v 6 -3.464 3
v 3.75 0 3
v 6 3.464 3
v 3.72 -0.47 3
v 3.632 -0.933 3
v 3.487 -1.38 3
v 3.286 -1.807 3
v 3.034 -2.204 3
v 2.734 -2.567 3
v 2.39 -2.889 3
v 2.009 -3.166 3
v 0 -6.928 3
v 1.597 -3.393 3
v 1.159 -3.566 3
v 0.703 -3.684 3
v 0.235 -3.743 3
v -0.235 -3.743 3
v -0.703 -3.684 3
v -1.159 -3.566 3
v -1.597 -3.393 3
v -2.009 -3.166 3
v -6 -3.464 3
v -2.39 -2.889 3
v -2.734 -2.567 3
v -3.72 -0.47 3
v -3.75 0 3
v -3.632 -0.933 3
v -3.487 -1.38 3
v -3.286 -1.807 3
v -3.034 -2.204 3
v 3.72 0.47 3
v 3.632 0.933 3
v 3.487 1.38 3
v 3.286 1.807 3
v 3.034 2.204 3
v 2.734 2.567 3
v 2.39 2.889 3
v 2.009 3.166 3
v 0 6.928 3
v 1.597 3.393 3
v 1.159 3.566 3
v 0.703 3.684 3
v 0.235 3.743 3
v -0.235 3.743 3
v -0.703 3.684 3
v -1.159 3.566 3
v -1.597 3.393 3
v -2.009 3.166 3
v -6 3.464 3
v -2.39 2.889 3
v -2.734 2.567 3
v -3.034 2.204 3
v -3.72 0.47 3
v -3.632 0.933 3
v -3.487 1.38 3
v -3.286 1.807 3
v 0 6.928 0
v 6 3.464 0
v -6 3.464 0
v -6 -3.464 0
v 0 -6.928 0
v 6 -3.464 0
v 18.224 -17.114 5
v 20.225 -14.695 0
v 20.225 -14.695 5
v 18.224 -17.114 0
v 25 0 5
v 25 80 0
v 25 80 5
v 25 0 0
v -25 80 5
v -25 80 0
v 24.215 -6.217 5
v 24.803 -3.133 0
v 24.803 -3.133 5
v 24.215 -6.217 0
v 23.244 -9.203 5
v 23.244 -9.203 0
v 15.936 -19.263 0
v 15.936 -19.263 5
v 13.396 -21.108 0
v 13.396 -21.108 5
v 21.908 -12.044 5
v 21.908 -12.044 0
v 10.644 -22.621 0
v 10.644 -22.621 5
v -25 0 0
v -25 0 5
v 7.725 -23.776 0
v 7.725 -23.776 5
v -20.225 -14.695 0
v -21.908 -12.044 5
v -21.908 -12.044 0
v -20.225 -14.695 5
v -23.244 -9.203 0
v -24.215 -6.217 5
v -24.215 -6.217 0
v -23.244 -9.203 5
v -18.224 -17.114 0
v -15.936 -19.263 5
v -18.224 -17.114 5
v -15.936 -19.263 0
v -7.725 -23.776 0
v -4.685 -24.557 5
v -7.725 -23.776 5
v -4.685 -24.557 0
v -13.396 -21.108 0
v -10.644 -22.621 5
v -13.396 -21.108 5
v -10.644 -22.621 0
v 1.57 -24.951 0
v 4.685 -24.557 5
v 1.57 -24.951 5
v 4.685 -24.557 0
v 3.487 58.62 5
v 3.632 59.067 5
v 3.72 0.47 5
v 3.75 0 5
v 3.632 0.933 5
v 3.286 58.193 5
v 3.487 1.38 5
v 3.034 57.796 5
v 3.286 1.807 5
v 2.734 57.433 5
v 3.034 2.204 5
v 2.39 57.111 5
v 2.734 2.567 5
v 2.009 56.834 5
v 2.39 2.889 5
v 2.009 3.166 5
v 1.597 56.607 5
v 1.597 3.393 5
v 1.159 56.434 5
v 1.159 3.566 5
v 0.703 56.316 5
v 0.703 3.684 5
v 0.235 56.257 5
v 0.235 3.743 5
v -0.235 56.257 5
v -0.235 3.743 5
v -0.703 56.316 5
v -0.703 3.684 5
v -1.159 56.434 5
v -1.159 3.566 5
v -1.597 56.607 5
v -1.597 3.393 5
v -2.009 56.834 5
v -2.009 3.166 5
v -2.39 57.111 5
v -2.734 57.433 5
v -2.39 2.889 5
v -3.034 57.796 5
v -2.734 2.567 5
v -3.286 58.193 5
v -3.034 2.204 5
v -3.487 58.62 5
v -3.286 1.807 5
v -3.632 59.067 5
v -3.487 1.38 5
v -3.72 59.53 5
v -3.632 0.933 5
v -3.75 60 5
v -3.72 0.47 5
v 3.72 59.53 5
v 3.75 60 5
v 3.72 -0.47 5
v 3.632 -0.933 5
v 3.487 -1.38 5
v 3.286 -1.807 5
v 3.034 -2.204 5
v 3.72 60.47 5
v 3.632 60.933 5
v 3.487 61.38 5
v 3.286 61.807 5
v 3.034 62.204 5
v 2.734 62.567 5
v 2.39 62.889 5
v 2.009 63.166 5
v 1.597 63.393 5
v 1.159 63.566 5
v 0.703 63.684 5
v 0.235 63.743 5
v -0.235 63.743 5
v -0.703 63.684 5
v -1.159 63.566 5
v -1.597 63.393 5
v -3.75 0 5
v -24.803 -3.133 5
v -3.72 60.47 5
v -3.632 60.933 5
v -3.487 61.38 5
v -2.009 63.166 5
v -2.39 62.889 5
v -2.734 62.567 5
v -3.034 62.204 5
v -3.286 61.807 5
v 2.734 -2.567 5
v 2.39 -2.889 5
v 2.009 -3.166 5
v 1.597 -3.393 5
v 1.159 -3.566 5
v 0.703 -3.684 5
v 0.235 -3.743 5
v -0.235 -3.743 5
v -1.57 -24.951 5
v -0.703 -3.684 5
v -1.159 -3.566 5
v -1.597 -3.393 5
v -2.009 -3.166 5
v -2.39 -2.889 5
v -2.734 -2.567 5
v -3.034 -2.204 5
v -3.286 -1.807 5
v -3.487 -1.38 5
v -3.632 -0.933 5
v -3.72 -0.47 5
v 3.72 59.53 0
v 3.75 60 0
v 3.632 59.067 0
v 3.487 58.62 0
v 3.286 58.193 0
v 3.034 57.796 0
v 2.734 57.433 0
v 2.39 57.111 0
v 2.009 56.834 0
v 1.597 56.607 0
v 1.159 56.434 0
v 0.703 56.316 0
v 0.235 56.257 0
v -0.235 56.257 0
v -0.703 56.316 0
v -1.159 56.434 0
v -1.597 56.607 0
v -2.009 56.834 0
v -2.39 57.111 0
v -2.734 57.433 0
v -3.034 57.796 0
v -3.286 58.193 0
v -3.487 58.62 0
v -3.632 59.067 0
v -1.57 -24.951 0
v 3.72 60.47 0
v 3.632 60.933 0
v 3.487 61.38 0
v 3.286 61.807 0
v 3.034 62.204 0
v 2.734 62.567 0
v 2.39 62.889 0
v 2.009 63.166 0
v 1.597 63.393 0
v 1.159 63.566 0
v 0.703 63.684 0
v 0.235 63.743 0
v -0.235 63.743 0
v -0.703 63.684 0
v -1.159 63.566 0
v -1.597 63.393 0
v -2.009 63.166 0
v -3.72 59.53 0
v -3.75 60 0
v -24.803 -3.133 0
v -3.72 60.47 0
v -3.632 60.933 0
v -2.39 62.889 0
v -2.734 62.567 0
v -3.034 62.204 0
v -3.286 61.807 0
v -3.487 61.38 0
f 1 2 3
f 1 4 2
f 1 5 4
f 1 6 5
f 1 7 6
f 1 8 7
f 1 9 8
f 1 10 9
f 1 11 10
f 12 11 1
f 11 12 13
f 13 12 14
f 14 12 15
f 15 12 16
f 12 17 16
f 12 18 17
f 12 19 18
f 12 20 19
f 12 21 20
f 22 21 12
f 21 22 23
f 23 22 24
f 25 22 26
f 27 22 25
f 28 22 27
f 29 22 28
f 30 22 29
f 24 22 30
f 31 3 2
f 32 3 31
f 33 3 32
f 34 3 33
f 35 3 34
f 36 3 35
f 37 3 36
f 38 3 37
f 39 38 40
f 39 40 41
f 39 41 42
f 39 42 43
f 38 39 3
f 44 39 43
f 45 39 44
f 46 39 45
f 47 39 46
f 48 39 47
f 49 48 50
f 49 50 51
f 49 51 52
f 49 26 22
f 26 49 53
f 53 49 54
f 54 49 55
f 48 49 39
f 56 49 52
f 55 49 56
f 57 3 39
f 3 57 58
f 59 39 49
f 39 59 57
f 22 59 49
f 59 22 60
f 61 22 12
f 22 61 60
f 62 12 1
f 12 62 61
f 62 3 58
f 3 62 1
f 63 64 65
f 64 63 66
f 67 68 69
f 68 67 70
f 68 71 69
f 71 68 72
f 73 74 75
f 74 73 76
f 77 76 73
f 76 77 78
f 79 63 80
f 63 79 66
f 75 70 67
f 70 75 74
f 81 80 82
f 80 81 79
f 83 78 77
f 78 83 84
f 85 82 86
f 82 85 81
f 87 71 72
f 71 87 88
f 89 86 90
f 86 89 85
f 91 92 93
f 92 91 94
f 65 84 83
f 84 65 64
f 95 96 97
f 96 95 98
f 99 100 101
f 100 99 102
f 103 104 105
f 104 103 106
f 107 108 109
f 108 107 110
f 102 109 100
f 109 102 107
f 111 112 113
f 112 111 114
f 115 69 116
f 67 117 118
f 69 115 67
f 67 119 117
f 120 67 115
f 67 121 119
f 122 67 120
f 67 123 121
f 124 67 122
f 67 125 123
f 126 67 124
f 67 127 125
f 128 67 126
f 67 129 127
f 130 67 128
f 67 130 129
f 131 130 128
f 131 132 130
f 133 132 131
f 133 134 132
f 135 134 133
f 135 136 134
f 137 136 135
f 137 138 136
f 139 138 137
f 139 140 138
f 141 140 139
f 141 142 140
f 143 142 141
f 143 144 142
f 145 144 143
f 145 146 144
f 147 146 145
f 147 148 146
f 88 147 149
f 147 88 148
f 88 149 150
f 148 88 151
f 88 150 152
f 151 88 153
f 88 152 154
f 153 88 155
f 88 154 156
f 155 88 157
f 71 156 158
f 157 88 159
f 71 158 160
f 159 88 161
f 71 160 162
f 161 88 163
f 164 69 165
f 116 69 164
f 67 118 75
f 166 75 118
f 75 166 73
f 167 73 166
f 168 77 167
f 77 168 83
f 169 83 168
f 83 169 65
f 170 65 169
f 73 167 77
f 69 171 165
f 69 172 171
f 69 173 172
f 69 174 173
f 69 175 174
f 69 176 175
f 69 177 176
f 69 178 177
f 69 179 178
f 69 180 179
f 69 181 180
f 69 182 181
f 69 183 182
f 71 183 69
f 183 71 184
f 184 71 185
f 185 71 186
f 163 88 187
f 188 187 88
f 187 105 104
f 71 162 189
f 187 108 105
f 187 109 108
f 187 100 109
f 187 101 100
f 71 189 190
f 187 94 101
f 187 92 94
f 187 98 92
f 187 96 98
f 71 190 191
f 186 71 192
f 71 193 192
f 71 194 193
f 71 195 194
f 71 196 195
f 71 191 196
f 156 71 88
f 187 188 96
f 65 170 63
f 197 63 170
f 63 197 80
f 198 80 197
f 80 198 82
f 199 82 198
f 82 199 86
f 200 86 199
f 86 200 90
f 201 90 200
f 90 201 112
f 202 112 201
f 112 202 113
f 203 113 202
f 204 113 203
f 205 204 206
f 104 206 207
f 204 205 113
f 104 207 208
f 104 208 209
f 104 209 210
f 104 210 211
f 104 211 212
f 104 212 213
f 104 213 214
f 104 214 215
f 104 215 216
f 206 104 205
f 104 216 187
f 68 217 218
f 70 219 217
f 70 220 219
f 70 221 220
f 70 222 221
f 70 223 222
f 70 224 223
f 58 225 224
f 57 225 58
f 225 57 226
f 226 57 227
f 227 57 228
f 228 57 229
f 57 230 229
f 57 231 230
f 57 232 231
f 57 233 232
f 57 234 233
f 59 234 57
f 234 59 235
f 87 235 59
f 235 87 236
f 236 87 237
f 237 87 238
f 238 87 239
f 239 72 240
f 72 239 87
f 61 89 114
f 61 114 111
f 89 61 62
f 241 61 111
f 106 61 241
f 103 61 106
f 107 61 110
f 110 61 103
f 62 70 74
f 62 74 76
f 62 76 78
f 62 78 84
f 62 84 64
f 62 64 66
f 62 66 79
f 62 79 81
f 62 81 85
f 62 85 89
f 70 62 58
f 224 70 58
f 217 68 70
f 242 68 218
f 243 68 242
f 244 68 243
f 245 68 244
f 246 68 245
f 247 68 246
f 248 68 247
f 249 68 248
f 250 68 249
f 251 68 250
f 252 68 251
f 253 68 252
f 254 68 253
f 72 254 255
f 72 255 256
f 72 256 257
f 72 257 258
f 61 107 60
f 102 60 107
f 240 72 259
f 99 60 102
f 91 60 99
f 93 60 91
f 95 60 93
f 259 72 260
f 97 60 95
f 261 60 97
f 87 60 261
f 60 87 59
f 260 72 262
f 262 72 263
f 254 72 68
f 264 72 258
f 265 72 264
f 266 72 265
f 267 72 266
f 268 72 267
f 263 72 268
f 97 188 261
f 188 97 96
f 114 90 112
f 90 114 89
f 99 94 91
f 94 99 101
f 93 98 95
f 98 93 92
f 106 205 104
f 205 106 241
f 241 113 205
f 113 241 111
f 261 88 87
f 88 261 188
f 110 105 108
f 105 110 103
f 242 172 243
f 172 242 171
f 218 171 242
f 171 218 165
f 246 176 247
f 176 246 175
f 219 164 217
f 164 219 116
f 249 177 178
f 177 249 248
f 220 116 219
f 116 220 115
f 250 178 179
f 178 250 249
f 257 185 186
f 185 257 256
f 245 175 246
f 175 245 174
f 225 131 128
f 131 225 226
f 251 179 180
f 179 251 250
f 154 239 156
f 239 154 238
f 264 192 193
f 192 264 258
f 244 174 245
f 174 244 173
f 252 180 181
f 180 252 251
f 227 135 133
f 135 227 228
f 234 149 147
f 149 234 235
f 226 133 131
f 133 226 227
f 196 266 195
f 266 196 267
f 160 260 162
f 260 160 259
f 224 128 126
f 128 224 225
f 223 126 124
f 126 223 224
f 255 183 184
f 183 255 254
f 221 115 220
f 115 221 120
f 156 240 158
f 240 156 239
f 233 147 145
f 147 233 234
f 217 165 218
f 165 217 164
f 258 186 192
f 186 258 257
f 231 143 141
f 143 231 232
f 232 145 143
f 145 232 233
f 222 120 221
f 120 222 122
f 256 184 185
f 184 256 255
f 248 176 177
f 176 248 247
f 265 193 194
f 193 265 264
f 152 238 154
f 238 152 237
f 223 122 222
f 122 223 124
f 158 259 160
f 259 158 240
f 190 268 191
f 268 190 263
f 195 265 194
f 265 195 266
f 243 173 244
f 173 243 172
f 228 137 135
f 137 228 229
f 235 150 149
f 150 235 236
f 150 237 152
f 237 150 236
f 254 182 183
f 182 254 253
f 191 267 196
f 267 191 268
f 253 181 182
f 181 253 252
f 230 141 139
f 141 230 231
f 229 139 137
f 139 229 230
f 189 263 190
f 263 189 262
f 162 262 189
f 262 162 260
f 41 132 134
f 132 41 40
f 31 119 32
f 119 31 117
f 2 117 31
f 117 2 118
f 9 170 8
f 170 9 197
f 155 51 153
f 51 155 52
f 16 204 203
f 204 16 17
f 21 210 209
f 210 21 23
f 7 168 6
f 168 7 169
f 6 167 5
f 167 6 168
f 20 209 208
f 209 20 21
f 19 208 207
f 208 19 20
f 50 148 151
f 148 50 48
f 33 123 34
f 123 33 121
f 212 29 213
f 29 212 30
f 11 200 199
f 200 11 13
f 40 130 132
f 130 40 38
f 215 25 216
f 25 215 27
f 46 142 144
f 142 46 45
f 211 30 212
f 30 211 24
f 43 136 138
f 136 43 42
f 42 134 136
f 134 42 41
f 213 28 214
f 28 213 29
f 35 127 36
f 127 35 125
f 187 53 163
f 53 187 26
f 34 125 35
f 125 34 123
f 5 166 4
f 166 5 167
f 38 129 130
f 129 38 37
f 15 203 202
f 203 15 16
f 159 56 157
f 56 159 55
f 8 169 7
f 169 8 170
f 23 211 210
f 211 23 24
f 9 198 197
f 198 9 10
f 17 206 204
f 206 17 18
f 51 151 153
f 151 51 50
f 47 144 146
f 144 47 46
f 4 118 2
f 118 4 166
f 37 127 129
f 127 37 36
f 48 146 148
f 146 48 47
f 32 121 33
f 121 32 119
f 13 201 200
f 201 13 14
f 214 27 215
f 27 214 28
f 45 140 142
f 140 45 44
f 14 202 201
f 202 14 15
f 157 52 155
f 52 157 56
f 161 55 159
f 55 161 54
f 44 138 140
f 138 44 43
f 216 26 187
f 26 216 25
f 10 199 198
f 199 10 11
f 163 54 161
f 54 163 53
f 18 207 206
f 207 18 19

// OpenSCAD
$fn=50;

module hexnut(size, depth) {
  cs=size*2;
  bias=size*1.5;
  difference() 
  {
    cube([size*2,size*2,depth],center=true);
    rotate([0,0, 60]) translate([bias,0,-1]) cube([cs,cs,depth*2],center=true);
    rotate([0,0,120]) translate([bias,0,-1]) cube([cs,cs,depth*2],center=true);
    rotate([0,0,180]) translate([bias,0,-1]) cube([cs,cs,depth*2],center=true);
    rotate([0,0,240]) translate([bias,0,-1]) cube([cs,cs,depth*2],center=true);
    rotate([0,0,300]) translate([bias,0,-1]) cube([cs,cs,depth*2],center=true);
    rotate([0,0,  0]) translate([bias,0,-1]) cube([cs,cs,depth*2],center=true);
  }
}

module plate(l,t) {
  difference() {
    union() {
      hull() {
        translate([-25,0,0]) cube([50,l-25,t]);
        cylinder(r=25,h=t);
      }
    }
    translate([0,60,-1]) cylinder(r=3.75,h=10);
    translate([0,0,-1]) cylinder(r=3.75,h=10);
translate([0,0,.5]) hexnut(12,5);
  }
}


plate(105,5);
